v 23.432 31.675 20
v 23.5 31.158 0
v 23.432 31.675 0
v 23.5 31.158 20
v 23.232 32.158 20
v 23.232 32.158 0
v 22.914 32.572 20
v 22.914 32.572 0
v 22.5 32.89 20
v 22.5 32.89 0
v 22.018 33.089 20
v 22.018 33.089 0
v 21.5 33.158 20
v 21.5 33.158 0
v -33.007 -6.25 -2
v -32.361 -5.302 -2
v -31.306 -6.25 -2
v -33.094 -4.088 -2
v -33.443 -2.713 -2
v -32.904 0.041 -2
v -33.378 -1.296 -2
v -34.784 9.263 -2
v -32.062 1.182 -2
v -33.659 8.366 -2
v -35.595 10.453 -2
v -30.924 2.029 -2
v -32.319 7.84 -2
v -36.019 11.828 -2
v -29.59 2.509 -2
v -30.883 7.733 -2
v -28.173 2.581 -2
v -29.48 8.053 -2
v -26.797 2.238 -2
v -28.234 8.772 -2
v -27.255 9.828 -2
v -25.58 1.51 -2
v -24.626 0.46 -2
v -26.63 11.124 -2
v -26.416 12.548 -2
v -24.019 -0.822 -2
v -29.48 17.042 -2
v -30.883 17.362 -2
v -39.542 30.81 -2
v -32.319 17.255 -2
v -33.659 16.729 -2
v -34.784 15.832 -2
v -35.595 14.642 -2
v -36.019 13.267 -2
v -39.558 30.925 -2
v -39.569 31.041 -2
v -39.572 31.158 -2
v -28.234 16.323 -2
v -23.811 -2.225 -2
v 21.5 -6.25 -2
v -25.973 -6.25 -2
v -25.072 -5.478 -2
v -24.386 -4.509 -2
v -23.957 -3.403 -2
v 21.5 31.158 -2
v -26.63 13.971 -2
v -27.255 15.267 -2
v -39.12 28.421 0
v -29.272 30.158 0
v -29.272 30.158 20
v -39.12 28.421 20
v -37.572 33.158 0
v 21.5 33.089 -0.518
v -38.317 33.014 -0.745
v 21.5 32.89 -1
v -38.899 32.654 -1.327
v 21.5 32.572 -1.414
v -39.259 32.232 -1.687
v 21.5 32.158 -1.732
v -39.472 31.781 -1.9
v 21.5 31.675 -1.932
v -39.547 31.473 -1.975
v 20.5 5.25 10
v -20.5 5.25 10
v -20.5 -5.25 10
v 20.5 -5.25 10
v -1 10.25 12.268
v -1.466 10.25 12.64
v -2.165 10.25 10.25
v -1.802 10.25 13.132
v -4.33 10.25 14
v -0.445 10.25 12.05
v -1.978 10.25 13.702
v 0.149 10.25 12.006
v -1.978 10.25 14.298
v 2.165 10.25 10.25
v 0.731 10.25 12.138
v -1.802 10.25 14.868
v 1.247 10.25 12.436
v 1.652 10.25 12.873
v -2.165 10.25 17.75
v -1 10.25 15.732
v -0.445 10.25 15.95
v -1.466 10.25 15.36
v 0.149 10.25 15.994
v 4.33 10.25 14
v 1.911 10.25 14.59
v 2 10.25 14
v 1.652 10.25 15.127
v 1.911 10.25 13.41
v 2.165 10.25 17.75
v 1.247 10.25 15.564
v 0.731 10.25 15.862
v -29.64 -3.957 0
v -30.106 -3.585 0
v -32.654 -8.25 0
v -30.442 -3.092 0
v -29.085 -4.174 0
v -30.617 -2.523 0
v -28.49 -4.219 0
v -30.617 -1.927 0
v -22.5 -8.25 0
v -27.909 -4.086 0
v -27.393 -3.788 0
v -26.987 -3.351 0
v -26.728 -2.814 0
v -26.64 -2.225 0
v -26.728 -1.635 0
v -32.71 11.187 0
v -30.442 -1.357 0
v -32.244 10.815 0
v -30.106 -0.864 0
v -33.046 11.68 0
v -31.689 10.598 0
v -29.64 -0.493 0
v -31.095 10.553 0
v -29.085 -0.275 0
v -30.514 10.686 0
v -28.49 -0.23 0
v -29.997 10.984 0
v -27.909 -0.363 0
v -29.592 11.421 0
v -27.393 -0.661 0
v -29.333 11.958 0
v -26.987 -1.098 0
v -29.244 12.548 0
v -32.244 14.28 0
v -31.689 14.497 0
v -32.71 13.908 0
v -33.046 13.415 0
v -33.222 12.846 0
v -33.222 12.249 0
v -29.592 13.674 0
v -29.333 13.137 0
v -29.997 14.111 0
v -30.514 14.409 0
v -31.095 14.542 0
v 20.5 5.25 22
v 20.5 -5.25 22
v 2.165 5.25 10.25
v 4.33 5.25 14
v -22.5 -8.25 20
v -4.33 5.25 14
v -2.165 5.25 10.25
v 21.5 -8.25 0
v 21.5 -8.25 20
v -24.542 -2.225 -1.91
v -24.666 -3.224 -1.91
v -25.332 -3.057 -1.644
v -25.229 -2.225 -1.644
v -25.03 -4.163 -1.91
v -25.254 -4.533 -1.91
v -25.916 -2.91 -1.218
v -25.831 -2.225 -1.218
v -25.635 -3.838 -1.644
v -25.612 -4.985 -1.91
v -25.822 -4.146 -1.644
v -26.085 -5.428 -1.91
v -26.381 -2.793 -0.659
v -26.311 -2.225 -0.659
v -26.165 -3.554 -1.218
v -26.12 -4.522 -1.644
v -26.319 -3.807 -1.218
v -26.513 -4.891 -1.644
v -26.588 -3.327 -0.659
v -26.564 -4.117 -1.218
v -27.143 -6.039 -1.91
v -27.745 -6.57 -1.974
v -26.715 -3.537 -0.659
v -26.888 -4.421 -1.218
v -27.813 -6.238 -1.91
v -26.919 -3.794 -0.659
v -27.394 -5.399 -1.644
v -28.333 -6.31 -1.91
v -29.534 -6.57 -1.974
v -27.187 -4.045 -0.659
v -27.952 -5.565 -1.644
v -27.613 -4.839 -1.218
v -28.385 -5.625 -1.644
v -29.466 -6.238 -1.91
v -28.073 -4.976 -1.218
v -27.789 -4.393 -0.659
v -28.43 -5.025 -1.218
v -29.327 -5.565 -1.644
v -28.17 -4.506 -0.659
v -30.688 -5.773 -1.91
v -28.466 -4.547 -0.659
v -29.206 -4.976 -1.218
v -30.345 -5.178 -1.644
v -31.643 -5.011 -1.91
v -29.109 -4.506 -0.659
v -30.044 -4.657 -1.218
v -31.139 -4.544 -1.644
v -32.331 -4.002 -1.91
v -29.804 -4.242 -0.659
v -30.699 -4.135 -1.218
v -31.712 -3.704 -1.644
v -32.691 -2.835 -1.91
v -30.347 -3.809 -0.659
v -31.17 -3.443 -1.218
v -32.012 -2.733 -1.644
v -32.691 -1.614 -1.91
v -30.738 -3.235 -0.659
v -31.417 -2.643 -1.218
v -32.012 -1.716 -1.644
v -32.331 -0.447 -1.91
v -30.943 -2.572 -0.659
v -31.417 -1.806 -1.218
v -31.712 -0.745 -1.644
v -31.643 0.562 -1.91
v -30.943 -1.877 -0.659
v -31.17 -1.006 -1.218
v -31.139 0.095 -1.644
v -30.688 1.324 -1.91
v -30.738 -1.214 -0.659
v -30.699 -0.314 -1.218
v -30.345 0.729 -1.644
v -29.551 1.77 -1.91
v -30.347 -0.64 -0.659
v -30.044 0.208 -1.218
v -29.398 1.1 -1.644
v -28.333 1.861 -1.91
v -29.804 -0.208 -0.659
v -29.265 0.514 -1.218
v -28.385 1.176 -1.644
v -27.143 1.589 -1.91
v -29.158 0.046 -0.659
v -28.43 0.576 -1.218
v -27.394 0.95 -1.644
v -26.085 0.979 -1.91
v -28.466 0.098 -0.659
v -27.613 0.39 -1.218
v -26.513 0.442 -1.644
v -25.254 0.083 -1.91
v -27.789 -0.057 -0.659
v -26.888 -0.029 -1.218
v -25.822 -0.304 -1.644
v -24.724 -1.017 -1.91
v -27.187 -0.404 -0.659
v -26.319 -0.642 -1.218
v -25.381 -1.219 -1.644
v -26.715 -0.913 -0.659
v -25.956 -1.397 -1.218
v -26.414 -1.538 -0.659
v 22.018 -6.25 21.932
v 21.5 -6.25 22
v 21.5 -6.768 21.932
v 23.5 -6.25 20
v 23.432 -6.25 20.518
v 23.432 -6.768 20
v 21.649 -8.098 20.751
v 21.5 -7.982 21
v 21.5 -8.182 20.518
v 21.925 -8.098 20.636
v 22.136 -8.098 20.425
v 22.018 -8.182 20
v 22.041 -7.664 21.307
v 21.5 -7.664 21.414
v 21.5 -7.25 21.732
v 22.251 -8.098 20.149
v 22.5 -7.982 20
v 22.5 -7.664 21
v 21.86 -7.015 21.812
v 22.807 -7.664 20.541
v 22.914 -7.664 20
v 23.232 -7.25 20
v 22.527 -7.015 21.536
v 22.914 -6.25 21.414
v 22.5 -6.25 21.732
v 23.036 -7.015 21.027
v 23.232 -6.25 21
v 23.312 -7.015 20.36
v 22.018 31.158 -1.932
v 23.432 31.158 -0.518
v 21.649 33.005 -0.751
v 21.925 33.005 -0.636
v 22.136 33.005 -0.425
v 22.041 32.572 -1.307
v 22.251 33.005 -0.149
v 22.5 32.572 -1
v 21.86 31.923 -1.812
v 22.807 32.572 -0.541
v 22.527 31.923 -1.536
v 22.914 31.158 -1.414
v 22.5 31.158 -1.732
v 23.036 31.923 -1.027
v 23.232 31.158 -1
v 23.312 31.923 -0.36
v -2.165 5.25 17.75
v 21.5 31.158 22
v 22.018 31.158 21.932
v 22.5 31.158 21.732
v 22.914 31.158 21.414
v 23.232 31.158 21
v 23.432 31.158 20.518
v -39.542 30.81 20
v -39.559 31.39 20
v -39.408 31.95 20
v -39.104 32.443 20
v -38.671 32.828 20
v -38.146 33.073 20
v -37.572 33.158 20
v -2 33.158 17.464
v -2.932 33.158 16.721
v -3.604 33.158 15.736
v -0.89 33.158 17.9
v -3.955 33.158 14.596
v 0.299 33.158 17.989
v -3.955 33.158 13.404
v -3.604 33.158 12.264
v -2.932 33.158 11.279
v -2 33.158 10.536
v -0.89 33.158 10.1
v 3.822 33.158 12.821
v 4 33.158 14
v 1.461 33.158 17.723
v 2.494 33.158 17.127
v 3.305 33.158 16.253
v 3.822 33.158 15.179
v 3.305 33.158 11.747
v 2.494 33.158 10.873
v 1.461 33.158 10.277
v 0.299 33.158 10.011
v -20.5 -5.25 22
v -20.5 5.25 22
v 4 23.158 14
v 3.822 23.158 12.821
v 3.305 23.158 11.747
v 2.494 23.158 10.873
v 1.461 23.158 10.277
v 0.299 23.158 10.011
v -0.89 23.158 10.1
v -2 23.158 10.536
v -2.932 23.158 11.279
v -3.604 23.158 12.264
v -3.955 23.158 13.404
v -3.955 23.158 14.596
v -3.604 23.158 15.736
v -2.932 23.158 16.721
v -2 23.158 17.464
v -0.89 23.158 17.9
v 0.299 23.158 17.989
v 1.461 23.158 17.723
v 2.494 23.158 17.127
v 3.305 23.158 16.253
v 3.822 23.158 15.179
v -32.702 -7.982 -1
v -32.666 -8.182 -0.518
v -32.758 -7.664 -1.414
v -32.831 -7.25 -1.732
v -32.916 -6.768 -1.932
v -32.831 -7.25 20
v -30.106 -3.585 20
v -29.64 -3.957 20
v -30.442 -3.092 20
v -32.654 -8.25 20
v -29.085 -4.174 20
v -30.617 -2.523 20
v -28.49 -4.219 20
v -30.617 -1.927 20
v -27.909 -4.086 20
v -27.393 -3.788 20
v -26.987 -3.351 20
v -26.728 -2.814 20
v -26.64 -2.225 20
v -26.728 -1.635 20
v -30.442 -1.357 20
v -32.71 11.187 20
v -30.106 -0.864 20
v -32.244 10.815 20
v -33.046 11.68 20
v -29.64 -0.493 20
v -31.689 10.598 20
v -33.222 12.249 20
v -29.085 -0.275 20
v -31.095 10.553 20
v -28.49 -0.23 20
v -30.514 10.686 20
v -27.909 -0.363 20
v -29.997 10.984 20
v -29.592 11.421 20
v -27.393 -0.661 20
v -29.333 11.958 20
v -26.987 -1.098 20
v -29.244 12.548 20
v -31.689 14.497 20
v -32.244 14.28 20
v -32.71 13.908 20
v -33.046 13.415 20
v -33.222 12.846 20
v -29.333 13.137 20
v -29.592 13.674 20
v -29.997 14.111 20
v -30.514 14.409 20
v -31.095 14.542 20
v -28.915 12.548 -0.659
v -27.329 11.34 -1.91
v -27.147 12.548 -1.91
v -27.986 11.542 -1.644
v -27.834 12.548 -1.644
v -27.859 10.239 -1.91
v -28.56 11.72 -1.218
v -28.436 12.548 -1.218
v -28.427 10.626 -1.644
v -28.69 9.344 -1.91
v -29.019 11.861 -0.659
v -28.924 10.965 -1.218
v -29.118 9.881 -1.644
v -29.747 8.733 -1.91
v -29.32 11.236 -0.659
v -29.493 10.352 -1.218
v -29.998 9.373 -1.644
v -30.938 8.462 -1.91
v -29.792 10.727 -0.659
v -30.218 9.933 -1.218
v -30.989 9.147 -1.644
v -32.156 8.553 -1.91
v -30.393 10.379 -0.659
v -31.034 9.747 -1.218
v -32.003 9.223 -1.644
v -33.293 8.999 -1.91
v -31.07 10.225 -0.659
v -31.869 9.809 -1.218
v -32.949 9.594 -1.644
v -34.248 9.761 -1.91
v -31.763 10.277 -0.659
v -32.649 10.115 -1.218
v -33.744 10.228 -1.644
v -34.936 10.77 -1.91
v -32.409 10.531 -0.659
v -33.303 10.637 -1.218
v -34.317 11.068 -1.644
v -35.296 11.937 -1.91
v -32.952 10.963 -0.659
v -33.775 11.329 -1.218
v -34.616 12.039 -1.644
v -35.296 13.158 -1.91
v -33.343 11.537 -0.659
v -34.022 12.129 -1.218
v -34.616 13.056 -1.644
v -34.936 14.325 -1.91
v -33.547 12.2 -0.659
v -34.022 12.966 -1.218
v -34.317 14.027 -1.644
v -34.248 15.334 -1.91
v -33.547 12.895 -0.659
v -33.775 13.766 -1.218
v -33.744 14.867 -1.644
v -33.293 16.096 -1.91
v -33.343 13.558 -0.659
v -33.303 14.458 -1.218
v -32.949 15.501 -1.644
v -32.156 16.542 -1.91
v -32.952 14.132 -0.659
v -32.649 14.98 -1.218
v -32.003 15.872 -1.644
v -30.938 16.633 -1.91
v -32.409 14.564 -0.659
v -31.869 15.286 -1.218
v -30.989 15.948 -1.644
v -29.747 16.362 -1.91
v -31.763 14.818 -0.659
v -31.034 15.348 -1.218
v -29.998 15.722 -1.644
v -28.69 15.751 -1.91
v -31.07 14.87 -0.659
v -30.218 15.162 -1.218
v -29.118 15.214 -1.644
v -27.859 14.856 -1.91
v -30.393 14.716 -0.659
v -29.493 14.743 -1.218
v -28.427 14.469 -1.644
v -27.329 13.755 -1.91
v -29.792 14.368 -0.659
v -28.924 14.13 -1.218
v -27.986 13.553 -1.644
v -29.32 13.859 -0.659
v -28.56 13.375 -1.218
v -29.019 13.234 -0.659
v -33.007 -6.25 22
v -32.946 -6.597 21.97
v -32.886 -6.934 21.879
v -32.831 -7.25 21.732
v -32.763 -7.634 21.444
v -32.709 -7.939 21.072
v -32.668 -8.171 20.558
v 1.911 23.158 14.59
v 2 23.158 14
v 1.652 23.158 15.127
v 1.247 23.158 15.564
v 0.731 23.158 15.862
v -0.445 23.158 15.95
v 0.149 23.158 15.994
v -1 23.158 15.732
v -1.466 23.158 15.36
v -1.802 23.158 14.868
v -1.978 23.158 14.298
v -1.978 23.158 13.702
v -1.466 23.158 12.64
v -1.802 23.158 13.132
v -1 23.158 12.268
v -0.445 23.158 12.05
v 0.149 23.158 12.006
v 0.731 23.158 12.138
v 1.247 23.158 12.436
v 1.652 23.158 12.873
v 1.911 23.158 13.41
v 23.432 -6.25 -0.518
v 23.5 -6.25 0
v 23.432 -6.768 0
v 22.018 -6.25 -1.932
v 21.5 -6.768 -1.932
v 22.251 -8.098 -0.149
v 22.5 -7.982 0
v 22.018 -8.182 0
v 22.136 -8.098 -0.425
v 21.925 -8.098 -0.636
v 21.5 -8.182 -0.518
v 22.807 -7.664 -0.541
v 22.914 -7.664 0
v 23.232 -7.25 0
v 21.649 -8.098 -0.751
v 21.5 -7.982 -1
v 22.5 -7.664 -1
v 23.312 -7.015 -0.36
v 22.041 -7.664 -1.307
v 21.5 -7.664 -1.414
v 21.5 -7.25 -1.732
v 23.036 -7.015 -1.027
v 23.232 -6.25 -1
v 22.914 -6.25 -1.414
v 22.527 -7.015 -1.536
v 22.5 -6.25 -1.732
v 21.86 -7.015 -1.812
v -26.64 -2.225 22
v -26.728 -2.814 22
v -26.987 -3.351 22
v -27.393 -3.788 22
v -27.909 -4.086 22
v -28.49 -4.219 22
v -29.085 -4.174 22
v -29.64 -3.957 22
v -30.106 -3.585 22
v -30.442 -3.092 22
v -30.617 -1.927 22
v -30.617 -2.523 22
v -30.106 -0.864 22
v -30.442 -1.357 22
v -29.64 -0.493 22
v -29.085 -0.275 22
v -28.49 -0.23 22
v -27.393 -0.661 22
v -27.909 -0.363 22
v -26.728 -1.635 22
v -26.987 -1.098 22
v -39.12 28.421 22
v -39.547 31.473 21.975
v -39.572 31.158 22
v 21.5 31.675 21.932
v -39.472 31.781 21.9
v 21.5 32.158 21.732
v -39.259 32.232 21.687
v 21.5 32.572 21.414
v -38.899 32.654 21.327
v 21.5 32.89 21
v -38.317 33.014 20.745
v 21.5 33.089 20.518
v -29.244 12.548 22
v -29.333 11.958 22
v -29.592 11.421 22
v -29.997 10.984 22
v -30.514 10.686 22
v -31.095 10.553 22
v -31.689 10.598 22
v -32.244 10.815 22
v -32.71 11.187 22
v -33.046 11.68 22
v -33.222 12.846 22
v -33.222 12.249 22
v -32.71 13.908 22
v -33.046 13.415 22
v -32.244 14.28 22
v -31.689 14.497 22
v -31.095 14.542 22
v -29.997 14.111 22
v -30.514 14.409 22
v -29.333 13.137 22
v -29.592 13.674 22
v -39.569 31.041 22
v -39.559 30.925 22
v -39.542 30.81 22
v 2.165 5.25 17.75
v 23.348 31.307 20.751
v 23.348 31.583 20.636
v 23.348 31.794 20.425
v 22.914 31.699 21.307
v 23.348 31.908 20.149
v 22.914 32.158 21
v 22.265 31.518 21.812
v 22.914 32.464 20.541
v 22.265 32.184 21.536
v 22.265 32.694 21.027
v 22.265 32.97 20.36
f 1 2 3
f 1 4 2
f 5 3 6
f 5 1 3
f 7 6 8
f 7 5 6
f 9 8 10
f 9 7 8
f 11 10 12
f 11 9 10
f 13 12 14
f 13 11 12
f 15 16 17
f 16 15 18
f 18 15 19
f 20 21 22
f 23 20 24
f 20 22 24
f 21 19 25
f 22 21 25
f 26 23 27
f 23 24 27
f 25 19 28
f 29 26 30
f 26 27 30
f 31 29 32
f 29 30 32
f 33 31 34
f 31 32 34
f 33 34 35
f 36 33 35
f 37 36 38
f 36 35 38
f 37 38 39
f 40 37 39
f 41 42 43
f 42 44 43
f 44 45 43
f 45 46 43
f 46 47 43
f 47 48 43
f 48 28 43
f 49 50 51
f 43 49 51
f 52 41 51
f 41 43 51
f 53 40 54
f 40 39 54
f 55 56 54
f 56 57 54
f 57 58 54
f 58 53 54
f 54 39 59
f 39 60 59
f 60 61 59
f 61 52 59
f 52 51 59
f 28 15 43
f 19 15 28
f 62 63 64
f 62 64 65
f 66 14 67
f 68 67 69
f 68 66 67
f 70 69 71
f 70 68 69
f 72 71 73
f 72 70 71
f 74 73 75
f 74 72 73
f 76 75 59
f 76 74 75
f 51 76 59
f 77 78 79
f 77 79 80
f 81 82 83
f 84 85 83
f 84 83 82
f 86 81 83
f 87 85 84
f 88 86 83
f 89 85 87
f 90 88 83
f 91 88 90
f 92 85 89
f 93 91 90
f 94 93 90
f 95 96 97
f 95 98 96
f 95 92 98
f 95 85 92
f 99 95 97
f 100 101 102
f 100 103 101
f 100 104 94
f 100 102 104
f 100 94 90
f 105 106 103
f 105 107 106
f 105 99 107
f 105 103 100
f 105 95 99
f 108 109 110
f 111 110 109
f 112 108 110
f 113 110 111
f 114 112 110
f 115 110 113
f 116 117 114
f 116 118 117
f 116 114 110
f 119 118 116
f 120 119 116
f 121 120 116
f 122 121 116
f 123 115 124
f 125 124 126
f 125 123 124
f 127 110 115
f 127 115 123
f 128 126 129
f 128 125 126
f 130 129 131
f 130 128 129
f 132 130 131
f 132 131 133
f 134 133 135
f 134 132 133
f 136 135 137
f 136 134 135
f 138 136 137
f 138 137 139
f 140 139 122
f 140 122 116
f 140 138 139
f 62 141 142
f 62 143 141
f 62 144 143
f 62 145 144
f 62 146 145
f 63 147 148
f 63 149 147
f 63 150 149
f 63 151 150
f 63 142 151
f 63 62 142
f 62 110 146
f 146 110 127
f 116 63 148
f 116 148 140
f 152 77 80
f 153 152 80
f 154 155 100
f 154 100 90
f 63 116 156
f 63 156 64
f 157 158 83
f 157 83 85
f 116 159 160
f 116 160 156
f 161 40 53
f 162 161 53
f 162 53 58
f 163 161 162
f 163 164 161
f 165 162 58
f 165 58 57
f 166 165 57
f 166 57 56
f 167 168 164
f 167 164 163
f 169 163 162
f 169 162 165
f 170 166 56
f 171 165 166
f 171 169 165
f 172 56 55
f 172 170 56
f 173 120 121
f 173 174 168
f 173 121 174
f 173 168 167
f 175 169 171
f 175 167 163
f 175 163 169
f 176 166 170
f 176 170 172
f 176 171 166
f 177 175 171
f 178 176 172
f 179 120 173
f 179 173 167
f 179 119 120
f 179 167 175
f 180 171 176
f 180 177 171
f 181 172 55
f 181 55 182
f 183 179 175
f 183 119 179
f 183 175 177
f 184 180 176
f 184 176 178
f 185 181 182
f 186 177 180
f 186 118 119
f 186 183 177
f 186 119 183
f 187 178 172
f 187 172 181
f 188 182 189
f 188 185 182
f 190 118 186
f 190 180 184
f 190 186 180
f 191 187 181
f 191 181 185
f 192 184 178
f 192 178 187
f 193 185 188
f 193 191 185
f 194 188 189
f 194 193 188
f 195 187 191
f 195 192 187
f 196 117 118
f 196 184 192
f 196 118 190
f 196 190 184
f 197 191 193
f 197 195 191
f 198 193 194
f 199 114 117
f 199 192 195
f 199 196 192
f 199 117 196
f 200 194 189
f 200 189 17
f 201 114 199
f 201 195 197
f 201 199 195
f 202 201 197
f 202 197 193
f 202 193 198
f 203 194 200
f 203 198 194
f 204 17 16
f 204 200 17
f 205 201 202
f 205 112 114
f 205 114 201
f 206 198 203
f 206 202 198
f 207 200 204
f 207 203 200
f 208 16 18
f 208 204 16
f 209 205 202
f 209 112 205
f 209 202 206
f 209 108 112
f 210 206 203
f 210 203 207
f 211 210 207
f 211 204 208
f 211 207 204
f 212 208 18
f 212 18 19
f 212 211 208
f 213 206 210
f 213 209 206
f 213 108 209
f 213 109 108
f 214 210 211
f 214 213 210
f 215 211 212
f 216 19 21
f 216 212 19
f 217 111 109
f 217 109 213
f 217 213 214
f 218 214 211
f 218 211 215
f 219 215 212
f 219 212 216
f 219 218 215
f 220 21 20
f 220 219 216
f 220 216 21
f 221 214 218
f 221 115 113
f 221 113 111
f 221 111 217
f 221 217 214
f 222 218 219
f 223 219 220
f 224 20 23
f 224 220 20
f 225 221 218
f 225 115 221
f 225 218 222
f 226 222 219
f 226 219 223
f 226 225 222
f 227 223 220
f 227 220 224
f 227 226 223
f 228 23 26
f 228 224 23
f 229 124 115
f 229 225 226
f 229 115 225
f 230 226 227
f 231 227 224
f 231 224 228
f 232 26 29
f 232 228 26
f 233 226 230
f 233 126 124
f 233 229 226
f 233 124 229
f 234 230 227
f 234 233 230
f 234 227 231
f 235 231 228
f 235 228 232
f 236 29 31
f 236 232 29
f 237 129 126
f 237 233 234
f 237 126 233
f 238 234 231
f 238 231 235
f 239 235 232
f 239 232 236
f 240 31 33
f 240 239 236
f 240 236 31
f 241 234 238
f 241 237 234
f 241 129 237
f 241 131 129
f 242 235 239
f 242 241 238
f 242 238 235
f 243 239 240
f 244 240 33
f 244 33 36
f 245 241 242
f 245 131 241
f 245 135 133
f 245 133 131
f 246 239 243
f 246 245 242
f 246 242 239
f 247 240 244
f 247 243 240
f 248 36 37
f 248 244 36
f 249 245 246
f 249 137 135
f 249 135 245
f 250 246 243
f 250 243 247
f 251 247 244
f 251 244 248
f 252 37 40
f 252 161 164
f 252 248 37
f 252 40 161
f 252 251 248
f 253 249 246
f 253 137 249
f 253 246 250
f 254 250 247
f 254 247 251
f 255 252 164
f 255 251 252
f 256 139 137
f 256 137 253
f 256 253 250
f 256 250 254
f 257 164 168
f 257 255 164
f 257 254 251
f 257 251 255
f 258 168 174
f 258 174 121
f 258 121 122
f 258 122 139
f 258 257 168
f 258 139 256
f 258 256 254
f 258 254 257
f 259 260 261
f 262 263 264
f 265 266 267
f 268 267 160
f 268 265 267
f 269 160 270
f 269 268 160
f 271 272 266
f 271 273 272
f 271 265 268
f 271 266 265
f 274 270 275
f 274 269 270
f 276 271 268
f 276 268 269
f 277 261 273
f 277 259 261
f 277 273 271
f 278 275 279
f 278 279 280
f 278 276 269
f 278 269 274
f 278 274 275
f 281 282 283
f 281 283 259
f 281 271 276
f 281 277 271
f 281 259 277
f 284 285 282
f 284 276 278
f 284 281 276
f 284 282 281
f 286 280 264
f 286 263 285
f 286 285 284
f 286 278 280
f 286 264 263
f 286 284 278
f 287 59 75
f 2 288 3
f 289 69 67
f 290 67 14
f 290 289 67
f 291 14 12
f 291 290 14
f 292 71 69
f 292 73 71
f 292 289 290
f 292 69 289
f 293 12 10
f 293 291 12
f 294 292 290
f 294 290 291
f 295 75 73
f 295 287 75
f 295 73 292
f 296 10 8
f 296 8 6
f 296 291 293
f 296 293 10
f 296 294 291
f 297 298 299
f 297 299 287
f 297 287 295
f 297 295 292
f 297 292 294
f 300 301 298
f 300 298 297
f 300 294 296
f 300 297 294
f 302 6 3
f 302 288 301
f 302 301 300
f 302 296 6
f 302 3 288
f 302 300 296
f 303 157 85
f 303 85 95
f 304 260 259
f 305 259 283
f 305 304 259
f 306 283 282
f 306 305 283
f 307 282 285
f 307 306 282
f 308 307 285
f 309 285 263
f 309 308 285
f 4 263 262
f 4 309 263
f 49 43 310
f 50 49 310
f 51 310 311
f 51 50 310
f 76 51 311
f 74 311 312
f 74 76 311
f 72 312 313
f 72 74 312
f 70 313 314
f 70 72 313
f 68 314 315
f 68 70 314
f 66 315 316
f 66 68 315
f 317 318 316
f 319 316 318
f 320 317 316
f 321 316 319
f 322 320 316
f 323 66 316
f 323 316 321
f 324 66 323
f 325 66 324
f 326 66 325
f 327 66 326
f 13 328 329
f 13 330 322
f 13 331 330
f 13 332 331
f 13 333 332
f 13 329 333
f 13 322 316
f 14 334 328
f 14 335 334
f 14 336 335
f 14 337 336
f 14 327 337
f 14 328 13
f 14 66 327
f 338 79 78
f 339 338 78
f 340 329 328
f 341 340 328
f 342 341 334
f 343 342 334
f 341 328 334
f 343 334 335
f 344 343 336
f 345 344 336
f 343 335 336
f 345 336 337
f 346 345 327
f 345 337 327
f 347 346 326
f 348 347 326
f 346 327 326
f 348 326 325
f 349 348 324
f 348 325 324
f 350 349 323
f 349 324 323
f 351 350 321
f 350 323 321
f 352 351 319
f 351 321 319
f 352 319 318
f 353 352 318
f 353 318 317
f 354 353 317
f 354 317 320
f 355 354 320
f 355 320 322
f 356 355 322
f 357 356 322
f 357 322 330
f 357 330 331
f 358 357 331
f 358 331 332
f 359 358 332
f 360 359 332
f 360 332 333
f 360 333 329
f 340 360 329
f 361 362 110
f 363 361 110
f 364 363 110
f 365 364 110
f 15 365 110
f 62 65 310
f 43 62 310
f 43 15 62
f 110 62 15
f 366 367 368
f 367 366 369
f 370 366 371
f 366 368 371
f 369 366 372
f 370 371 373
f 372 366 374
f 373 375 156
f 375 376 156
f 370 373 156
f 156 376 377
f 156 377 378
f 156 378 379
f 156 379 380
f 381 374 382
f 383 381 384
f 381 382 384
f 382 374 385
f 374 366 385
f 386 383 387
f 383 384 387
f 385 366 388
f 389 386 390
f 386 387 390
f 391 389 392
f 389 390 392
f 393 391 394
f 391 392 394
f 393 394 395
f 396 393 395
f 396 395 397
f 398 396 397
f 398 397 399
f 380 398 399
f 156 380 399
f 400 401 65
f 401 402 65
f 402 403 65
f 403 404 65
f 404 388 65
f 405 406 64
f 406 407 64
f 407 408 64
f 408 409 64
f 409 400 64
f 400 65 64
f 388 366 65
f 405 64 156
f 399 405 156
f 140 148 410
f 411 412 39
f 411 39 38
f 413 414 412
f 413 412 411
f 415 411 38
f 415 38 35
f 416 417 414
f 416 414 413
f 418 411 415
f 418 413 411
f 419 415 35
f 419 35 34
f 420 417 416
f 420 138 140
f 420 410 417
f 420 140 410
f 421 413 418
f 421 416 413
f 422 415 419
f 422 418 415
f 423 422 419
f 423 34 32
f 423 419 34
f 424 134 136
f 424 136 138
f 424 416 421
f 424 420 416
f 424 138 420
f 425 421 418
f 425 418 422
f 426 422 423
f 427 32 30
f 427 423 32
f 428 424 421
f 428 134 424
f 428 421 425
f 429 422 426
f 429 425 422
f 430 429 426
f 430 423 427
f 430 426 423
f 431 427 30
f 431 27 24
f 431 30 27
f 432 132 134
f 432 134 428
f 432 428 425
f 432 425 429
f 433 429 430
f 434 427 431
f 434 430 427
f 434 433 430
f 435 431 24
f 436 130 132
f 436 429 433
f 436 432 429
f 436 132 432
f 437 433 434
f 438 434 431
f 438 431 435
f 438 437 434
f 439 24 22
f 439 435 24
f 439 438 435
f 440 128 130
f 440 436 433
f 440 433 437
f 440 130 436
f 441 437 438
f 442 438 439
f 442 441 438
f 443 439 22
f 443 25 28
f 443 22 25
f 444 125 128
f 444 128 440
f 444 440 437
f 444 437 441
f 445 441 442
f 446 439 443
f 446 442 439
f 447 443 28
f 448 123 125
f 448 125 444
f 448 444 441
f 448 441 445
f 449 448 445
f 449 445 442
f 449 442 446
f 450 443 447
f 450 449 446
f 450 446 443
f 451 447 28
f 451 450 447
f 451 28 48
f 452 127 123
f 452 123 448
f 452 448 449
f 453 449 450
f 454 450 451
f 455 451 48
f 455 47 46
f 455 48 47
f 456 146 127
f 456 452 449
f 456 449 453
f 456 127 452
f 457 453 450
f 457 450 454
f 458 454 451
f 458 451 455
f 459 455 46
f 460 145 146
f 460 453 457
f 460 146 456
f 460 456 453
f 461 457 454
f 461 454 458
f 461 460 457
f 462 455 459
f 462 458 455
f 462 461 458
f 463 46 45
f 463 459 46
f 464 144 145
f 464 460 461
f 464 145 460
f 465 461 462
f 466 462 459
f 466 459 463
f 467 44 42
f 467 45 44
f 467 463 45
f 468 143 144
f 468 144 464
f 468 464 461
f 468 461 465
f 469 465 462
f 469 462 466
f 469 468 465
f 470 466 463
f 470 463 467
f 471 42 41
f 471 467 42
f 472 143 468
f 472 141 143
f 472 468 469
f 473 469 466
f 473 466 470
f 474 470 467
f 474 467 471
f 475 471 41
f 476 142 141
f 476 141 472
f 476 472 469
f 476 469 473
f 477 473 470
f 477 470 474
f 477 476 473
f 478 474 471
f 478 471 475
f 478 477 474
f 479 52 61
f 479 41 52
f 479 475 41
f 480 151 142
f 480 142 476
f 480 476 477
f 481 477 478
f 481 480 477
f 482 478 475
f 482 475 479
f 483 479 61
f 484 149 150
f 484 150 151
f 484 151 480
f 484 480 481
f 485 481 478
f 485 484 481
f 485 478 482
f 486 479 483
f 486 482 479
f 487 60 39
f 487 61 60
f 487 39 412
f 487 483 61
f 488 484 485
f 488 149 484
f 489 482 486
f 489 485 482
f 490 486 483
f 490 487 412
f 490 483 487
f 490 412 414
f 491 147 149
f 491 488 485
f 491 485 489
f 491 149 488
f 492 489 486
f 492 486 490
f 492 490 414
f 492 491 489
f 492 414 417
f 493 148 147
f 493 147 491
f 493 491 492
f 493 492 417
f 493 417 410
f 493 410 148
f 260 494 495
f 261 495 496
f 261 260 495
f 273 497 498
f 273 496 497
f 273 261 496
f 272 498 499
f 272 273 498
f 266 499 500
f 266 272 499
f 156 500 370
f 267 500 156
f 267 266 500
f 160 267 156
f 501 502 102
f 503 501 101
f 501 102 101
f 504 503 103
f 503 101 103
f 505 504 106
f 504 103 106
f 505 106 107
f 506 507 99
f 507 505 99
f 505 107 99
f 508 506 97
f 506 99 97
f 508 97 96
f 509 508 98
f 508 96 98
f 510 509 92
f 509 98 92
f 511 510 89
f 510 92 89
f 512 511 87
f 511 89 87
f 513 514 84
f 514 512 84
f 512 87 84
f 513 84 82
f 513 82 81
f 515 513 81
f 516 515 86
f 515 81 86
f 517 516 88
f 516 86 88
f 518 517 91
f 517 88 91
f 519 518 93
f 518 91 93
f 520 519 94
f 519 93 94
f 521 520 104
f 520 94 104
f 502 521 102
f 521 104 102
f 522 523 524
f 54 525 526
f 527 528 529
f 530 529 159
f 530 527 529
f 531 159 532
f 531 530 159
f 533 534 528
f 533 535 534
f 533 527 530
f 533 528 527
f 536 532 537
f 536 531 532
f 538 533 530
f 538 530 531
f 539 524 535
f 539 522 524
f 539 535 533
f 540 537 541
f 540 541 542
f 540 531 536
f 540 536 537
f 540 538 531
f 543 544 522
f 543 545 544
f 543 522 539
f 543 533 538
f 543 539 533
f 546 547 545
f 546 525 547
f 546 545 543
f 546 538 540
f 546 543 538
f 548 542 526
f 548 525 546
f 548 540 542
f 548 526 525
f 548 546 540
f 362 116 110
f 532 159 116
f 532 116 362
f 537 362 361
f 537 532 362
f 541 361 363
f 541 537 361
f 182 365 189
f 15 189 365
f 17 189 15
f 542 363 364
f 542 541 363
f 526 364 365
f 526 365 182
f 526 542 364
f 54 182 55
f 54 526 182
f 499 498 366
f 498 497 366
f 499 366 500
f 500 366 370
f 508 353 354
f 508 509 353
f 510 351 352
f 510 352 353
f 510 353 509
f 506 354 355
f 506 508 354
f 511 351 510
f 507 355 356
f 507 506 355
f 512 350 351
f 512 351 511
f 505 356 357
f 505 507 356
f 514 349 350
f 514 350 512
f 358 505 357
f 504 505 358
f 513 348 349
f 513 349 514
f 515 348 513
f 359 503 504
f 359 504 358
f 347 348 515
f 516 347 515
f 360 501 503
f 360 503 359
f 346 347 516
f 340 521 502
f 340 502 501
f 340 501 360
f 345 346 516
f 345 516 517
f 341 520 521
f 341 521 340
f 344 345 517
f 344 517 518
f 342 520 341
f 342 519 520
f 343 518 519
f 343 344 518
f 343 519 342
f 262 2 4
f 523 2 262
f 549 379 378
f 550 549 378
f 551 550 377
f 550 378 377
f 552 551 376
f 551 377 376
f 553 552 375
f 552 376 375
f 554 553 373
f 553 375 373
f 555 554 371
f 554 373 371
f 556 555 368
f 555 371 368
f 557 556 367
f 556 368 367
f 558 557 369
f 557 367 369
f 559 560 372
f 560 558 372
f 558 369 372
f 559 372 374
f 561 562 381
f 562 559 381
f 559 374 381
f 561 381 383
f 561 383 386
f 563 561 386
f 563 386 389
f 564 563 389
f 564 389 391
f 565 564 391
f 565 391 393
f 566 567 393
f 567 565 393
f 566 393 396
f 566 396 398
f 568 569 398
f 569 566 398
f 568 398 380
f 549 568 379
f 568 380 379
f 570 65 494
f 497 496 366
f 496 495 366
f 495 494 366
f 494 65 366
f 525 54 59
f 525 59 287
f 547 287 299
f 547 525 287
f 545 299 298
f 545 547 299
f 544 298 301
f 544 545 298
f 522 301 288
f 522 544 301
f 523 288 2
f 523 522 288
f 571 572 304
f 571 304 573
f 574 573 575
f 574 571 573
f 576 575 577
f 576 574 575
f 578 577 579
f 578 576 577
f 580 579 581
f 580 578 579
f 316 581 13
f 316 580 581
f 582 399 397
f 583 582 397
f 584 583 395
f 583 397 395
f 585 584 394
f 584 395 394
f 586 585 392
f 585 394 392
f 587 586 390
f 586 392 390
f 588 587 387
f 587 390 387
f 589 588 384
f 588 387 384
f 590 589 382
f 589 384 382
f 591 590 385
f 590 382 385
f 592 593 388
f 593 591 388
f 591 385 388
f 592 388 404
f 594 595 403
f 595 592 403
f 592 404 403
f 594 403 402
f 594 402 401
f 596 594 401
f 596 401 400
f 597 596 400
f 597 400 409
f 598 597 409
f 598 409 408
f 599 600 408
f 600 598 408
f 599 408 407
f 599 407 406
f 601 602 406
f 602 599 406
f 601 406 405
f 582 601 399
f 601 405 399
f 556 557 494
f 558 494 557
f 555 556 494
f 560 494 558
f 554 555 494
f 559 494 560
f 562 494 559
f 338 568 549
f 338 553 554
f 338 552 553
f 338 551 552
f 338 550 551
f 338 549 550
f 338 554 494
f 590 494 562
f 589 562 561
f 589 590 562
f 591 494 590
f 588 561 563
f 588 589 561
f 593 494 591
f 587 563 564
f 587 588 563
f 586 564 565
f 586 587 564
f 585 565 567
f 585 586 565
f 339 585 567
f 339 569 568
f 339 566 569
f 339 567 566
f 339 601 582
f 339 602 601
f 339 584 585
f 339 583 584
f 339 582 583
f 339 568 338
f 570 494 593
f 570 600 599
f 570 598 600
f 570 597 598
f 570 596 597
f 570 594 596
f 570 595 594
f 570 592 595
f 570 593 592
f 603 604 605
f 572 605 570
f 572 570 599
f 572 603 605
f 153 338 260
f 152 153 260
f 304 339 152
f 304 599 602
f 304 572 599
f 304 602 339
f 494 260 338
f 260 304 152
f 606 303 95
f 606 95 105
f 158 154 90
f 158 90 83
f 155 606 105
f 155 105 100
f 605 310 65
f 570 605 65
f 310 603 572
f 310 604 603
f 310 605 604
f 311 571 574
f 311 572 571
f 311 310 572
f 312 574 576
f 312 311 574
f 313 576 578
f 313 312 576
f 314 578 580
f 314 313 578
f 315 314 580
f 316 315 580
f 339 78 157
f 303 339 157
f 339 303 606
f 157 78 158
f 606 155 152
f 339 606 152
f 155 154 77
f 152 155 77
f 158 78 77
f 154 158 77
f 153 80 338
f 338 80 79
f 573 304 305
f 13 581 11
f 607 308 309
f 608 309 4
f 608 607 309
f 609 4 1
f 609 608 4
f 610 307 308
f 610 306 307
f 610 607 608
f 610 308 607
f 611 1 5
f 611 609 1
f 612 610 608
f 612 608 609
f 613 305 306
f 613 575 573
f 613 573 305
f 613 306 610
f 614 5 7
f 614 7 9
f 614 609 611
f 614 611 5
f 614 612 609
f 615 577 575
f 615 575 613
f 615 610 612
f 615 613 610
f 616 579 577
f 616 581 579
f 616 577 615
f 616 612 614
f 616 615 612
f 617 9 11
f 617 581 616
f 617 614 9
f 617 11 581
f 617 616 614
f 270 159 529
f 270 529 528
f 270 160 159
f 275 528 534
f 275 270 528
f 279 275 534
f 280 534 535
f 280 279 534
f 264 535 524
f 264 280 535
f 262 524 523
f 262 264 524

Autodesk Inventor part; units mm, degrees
ref_plane "YZ Plane" through (0, 0, 0) normal (1, 0, 0) x (0, 1, 0)
ref_plane "XZ Plane" through (0, 0, 0) normal (0, 1, 0) x (-1, 0, 0)
ref_plane "XY Plane" through (0, 0, 0) normal (0, 0, 1) x (1, 0, 0)
sketch "Skizze1" plane through (0, 0, 0) normal (0, 0, 1) x (1, 0, 0)
  line L0 (20.5, -5.25) -> (-20.5, -5.25)
  line L1 (-20.5, -5.25) -> (-20.5, 5.25)
  line L2 (-20.5, 5.25) -> (20.5, 5.25)
  line L3 (20.5, 5.25) -> (20.5, -5.25)
  line L4 (20.5, -5.25) -> (-20.5, 5.25) construction
  line L5 (-20.5, -5.25) -> (20.5, 5.25) construction
  line L6 (-22.5, -8.25) -> (-39.9555, -8.25)
  line L7 (-39.9555, -8.25) -> (-39.9555, 33.1575)
  line L8 (-39.9555, 33.1575) -> (-22.5, 33.1575)
  line L9 (-22.5, 33.1575) -> (-22.5, -8.25)
  line L10 (-22.5, 33.1575) -> (23.5, 33.1575)
  line L11 (23.5, 33.1575) -> (23.5, -8.25)
  line L12 (23.5, -8.25) -> (-22.5, -8.25)
  line L13 (-22.5, -8.25) -> (-22.5, 33.1575)
  line L14 (-22.5, -8.25) -> (-39.9555, -8.25)
  line L15 (-22.5, 30.1575) -> (-39.9555, 30.1575)
  line L16 (-22.5, -8.25) -> (-29.2723, 30.1575)
  line L17 (-32.6543, -8.25) -> (-39.9555, 33.1575)
  line L18 (-36.3049, 12.4538) -> (-25.8861, 10.9538) construction
  line L19 (-34.3494, 30.1575) -> (-27.5771, -8.25) construction
  circle A0 centre (-31.2443, 12.5475) radius 2
  circle A1 centre (-28.6396, -2.2246) radius 2
  line L20 (-29.2723, 30.1575) -> (-39.9555, 28.2738)
  line L21 (-22.5, -8.25) -> (-22.5, -8.25)
  point P0 (0, 0)
  point P1 (-32.6543, -8.25)
  point P2 (-39.4265, 30.1575)
  point P3 (-31.0955, 11.7038)
  point P4 (-39.1204, 28.421)
  point P5 (-32.334, -7.473)
  dimension "d0" = 10.5
  dimension "d1" = 41
  dimension "d2" = 3
  dimension "d3" = 3
  dimension "d4" = 3
  dimension "d6" = 10
  dimension "d7" = 10
  dimension "d16" = 4
  dimension "d18" = 15
  dimension "d21" = 39
  dimension "d23" = 17
  dimension "d24" = 7
  dimension "d29" = 2
extrude "Extrusion1" add sketch "Skizze1" along normal blind 20 contours L16 L15 L9 | L9 L10 L11 L12 | L15 L17 L8 L9 | L20 L17 L15
extrude "Extrusion2" add sketch "Skizze1" against normal blind 2 contours L0 L1 L2 L3 | L16 L15 L9 | L9 L10 L11 L12 | L6 L17 L20 L16 | L15 L17 L8 L9 | L20 L17 L15
sketch "Skizze2" plane through (0, 0, 20) normal (0, 0, 1) x (1, 0, 0)
  line L0 (-39.9555, 33.1575) -> (-39.1204, 28.421) projected
  line L1 (23.5, -8.25) -> (23.5, 33.1575) projected
  line L2 (23.5, 33.1575) -> (-39.9555, 33.1575) projected
  line L3 (20.5, -5.25) -> (-20.5, -5.25) projected
  line L4 (-20.5, -5.25) -> (-20.5, 5.25) projected
  line L5 (-20.5, 5.25) -> (20.5, 5.25) projected
  line L6 (20.5, 5.25) -> (20.5, -5.25) projected
  line L7 (-39.9555, 33.1575) -> (-32.8306, -7.25) projected
  line L8 (-39.9555, 33.1575) -> (-32.8306, -7.25)
  circle A0 centre (-28.6396, -2.2246) radius 2 projected
  circle A1 centre (-31.2443, 12.5475) radius 2 projected
  line L9 (-39.1204, 28.421) -> (-29.2723, 30.1575) projected
  line L10 (-29.2723, 30.1575) -> (-22.5, -8.25) projected
  line L11 (-22.5, -8.25) -> (23.5, -8.25) projected
  line L12 (-39.1204, 28.421) -> (-29.2723, 30.1575) projected
  line L13 (-39.1204, 28.421) -> (-32.6543, -8.25) projected
  line L14 (-32.6543, -8.25) -> (-22.5, -8.25) projected
  line L15 (-29.2723, 30.1575) -> (-22.5, -8.25) projected
  circle A2 centre (-28.6396, -2.2246) radius 2 projected
  circle A3 centre (-31.2443, 12.5475) radius 2 projected
  point P0 (0, 0)
  point P1 (-39.1307, 33.9543)
  point P2 (-39.1307, 33.9543)
  point P3 (-32.6543, -7.25)
  point P4 (-32.8306, -7.25)
extrude "Extrusion3" add sketch "Skizze2" along normal blind 2
fillet "Rundung1" radius 2 9 edges at (-8.2278, 33.1575, 22) (23.5, 12.4538, 22) (23.5, 12.4538, -2) (23.5, 33.1575, 10) (23.5, -8.25, 10) (-4.5771, -8.25, -2) (-8.2278, 33.1575, -2) (-4.5771, -8.25, 22) (-39.9555, 33.1575, 10)
sketch "Skizze3" plane through (-32.6543, -7.5, 20) normal (0, -1, 0) x (1, 0, 0)
  line L0 (53.1543, -20) -> (53.1543, 2) projected
  line L1 (53.1543, -9) -> (0, -9)
  line L2 (0, -20) -> (0, 0) projected
  line L3 (53.1543, 2) -> (12.1543, 2) projected
  line L4 (32.6543, -20) -> (32.6543, 2)
  circle A0 centre (32.6543, -9) radius 2
  dimension "d25" = 4
extrude "Extrusion4" [suppressed]
fillet "Rundung2" [suppressed]
sketch "Skizze5" plane through (-22.5, -8.25, 20) normal (0, -1, 0) x (1, 0, 0)
  line L0 (43, -20) -> (2, -20) projected
  line L1 (2, -20) -> (2, 2) projected
  line L2 (43, -20) -> (43, 2) projected
  line L3 (22.5, -14) -> (22.5, 2) construction
  line L4 (-17.072, 2) -> (44, 2) projected
  circle A0 centre (22.5, -6) radius 2
  line L5 (43, 2) -> (2, 2) projected
  line L6 (2, -6) -> (43, -6) construction
  dimension "d34" = 4
  dimension "d45" = 16
extrude "Extrusion6" cut sketch "Skizze5" against normal through all contours A0
fillet "Rundung3" [suppressed]
fillet "Rundung4" radius 3 2 edges at (-33.2443, 12.5475, -2) (-30.6396, -2.2246, -2)
extrude "Extrusion7" add sketch "Skizze5" against normal up to surface (3 mm away) contours A0
sketch "Skizze6" plane through (-37.572, 33.1575, 0) normal (0, 1, 0) x (1, 0, 0)
  circle A0 centre (37.572, -14) radius 2 projected
  circle A1 centre (37.572, -14) radius 2 projected
  circle A2 centre (37.572, -14) radius 4
  point P0 (37.572, 0)
  dimension "d40" = 8
extrude "Extrusion8" cut sketch "Skizze6" against normal blind 10
sketch "Skizze7" plane through (0, 0, 0) normal (0, 0, 1) x (1, 0, 0)
  line L0 (20.5, 5.25) -> (20.5, -5.25) projected
  line L1 (-20.5, 5.25) -> (20.5, 5.25) projected
  line L2 (-20.5, -5.25) -> (-20.5, 5.25) projected
  line L3 (20.5, -5.25) -> (-20.5, -5.25) projected
  point P0 (0, 0)
extrude "Extrusion9" add sketch "Skizze7" along normal blind 10
sketch "Skizze8" plane through (-20.5, 5.25, 22) normal (0, -1, 0) x (1, 0, 0)
  circle A0 centre (20.5, -8) radius 2 projected
  line L0 (24.8301, -8) -> (22.6651, -11.75)
  line L1 (22.6651, -11.75) -> (18.3349, -11.75)
  line L2 (18.3349, -11.75) -> (16.1699, -8)
  line L3 (16.1699, -8) -> (18.3349, -4.25)
  line L4 (18.3349, -4.25) -> (22.6651, -4.25)
  line L5 (22.6651, -4.25) -> (24.8301, -8)
  line L6 (0, -12) -> (41, -12) projected
  point P0 (20.5, -22)
  dimension "d46" = 7.5
extrude "Extrusion10" cut sketch "Skizze8" against normal blind 5
equation "\"d3\" = d2"
equation "\"d4\" = d2"
properties part number "_3D-Druck"
